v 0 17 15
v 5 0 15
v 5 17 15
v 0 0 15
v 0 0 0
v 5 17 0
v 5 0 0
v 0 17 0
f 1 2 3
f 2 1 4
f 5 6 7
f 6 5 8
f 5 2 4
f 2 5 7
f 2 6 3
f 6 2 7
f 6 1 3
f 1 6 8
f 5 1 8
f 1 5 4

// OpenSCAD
// Generated by SolidPython 1.0.1 on 2020-07-29 00:46:54


cube(size = [5, 17, 15]);
/***********************************************
*********      SolidPython code:      **********
************************************************
 
# import packages: SolidPython
from solid import *
from solid.utils import *
from itertools import chain, combinations, permutations


class Resize:

    def __init__(self, scad_file):
        self.scad_file = scad_file
        #self.scad_file = import_scad(scad_file)
        # cone/cylinder param:
        self.r1 = 0
        self.r2 = 0
        self.h = 0
        # rectangular prism param:
        self.w = 0
        self.l = 0
        # ellipse param:
        self.r = 0

    # import OpenScad code (file name corresponds to shape)


    # classify shape + parameters
    def assign(self, param1, param2, param3):
        if self.scad_file == 'cone.scad':
            self.r1 = param1
            self.r2 = param2
            self.h = param3
        elif self.scad_file == 'cylinder.scad':
            self.r1 = param1
            self.r2 = param2
            self.h = param3
        elif self.scad_file == 'rectangularPrism.scad':
            self.h = param1
            self.l = param2
            self.w = param3
        else:
            self.r = param1
            self.h = param2

    # resize parameters
    def iterate(self):
        x = range(3, 20, 2)
        i = 1
        if self.scad_file == 'cone.scad':
            tempList = list(permutations(x, 2))
            for temp in tempList:
                param1 = temp[0]
                param2 = temp[1]
                filepath = 'produced_scad_files/' + 'cone' + str(param1) + '_' + str(param2) + '_' + '.scad'
                scad_render_to_file(cylinder(h=param1, r1=param2, r2=0), filepath)

        elif self.scad_file == 'cylinder.scad':
            tempList = list(permutations(x, 3))
            for temp in tempList:
                param1 = temp[0]
                param2 = temp[1]
                filepath = 'produced_scad_files/' + 'cylinder' + str(param1) + '_' + str(param2) + '_' + '.scad'
                scad_render_to_file(cylinder(h=param1, r1=param2, r2=param2), filepath)

        elif self.scad_file == 'rectangularPrism.scad':
            tempList = list(permutations(x, 3))
            for temp in tempList:
                param1 = temp[0]
                param2 = temp[1]
                param3 = temp[2]
                filepath = 'produced_scad_files/' + 'rectangularPrism' + str(param1) + '_' + str(param2) + '_' + str(
                    param3) + '.scad'
                scad_render_to_file(cube(size=(param1, param2, param3)), filepath)

        elif self.scad_file == 'ellipse.scad':
            tempList = list(permutations(x, 4))
            for temp in tempList:
                param1 = temp[0]
                param2 = temp[1]
                param3 = temp[2]
                param4 = temp[3]
                filepath = 'produced_scad_files/' + 'ellipse' + str(param1) + '_' + str(param2) + '_' + str(param3) + '_' + str(param4) + '.scad'
                scad_render_to_file(scale([param1, param2, param3])(sphere(r=param4)), filepath)

    def render_to_scadfile(self):
        scad_render_to_file(scad, 'example.scad') 
 
************************************************/
